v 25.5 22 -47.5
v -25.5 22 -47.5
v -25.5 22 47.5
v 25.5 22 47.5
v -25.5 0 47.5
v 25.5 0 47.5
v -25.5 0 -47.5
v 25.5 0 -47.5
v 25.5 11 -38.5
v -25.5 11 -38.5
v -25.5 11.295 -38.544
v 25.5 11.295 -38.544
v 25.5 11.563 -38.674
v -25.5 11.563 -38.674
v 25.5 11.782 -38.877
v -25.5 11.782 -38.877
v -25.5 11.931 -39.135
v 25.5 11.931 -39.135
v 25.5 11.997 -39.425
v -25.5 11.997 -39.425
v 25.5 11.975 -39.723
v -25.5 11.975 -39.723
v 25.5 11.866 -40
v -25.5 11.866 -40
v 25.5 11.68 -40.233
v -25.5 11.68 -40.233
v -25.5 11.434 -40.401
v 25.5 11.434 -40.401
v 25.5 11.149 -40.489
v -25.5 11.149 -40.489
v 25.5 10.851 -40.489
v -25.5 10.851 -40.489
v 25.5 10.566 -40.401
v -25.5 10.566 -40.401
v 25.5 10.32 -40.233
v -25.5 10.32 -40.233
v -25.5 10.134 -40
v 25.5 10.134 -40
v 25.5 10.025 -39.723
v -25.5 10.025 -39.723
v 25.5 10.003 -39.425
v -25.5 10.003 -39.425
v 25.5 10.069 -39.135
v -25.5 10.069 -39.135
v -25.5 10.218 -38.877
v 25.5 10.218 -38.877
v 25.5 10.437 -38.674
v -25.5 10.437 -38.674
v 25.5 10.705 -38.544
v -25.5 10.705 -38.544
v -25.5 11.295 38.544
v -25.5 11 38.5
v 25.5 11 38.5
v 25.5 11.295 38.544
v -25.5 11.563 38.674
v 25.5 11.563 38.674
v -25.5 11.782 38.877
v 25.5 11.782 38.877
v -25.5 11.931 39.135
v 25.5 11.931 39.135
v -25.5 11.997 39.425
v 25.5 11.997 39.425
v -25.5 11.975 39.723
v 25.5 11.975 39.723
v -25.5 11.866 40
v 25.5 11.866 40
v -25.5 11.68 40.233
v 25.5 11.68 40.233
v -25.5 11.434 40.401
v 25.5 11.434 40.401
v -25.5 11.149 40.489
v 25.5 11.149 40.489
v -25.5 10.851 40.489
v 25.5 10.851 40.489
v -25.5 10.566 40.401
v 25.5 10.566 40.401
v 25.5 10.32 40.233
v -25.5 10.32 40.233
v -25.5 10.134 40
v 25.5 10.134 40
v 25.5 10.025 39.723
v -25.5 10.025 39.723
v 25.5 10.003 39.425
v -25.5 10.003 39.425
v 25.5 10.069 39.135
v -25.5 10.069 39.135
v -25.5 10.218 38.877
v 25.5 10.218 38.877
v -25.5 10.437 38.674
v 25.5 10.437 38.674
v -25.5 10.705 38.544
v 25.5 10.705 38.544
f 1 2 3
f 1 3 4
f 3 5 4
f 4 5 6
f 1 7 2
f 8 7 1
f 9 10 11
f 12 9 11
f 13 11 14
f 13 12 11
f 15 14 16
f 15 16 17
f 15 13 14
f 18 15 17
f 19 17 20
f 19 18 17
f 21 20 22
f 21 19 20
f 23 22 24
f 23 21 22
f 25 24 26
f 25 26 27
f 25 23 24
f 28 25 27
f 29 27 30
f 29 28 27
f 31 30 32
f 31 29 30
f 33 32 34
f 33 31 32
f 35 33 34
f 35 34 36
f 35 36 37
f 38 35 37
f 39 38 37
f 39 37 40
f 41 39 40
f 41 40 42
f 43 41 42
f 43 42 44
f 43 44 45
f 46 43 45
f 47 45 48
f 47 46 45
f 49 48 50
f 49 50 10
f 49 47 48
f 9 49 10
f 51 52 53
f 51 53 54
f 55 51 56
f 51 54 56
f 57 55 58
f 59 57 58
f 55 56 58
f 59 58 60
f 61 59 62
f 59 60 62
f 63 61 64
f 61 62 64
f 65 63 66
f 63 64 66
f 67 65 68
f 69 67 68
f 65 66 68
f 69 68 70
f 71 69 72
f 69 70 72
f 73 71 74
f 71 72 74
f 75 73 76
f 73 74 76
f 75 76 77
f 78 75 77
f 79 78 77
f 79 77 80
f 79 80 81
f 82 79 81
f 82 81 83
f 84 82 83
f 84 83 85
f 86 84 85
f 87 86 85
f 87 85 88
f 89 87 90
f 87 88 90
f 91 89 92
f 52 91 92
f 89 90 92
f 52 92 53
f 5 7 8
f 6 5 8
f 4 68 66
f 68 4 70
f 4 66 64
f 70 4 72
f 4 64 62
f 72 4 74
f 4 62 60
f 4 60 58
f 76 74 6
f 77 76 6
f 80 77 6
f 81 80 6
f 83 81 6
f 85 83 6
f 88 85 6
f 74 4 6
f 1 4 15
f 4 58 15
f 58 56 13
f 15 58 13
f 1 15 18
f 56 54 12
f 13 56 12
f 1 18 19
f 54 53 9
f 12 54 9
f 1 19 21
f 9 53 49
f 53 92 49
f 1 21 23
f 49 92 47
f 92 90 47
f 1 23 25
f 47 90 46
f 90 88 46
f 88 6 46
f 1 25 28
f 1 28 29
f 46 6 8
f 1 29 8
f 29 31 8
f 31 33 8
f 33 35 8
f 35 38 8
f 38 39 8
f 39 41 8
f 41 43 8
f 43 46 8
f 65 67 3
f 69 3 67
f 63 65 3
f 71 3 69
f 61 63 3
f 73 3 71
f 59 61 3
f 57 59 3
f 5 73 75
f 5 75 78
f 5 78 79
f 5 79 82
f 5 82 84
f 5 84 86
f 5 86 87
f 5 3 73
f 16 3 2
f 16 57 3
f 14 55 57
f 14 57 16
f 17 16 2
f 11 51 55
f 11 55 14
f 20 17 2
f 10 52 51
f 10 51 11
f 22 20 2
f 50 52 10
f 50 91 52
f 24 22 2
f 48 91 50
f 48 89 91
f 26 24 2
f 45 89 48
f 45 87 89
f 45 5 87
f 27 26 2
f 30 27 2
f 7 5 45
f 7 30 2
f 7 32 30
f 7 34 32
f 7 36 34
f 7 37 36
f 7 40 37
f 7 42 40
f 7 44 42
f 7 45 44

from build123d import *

# Parameters (mm, degrees)
SKETCH_1_W          = 51
SKETCH_1_H          = 95
EXTRUDE_1_DEPTH     = 22
SKETCH_2_R          = 1
CUT_EXTRUDE_1_DEPTH = 51


with BuildPart() as part:
    # 草图1 → 凸台-拉伸1 (new body)
    with BuildSketch(Plane(origin=(0, 0, 0), x_dir=(1, 0, 0), z_dir=(0, 1, 0))):
        Rectangle(SKETCH_1_W, SKETCH_1_H)
    extrude(amount=EXTRUDE_1_DEPTH)

    # 草图2 → 切除-拉伸1 (cut)
    with BuildSketch(Plane(origin=(25.5, 0, 0), x_dir=(0, 0, -1), z_dir=(1, 0, 0))):
        with Locations((-39.5, 11)):
            Circle(SKETCH_2_R)
    cut_extrude_1 = extrude(amount=-CUT_EXTRUDE_1_DEPTH, mode=Mode.SUBTRACT)

    # 镜向1: 切除-拉伸1 across plane
    add(cut_extrude_1.mirror(Plane.XY), mode=Mode.SUBTRACT)


solid = part.part
